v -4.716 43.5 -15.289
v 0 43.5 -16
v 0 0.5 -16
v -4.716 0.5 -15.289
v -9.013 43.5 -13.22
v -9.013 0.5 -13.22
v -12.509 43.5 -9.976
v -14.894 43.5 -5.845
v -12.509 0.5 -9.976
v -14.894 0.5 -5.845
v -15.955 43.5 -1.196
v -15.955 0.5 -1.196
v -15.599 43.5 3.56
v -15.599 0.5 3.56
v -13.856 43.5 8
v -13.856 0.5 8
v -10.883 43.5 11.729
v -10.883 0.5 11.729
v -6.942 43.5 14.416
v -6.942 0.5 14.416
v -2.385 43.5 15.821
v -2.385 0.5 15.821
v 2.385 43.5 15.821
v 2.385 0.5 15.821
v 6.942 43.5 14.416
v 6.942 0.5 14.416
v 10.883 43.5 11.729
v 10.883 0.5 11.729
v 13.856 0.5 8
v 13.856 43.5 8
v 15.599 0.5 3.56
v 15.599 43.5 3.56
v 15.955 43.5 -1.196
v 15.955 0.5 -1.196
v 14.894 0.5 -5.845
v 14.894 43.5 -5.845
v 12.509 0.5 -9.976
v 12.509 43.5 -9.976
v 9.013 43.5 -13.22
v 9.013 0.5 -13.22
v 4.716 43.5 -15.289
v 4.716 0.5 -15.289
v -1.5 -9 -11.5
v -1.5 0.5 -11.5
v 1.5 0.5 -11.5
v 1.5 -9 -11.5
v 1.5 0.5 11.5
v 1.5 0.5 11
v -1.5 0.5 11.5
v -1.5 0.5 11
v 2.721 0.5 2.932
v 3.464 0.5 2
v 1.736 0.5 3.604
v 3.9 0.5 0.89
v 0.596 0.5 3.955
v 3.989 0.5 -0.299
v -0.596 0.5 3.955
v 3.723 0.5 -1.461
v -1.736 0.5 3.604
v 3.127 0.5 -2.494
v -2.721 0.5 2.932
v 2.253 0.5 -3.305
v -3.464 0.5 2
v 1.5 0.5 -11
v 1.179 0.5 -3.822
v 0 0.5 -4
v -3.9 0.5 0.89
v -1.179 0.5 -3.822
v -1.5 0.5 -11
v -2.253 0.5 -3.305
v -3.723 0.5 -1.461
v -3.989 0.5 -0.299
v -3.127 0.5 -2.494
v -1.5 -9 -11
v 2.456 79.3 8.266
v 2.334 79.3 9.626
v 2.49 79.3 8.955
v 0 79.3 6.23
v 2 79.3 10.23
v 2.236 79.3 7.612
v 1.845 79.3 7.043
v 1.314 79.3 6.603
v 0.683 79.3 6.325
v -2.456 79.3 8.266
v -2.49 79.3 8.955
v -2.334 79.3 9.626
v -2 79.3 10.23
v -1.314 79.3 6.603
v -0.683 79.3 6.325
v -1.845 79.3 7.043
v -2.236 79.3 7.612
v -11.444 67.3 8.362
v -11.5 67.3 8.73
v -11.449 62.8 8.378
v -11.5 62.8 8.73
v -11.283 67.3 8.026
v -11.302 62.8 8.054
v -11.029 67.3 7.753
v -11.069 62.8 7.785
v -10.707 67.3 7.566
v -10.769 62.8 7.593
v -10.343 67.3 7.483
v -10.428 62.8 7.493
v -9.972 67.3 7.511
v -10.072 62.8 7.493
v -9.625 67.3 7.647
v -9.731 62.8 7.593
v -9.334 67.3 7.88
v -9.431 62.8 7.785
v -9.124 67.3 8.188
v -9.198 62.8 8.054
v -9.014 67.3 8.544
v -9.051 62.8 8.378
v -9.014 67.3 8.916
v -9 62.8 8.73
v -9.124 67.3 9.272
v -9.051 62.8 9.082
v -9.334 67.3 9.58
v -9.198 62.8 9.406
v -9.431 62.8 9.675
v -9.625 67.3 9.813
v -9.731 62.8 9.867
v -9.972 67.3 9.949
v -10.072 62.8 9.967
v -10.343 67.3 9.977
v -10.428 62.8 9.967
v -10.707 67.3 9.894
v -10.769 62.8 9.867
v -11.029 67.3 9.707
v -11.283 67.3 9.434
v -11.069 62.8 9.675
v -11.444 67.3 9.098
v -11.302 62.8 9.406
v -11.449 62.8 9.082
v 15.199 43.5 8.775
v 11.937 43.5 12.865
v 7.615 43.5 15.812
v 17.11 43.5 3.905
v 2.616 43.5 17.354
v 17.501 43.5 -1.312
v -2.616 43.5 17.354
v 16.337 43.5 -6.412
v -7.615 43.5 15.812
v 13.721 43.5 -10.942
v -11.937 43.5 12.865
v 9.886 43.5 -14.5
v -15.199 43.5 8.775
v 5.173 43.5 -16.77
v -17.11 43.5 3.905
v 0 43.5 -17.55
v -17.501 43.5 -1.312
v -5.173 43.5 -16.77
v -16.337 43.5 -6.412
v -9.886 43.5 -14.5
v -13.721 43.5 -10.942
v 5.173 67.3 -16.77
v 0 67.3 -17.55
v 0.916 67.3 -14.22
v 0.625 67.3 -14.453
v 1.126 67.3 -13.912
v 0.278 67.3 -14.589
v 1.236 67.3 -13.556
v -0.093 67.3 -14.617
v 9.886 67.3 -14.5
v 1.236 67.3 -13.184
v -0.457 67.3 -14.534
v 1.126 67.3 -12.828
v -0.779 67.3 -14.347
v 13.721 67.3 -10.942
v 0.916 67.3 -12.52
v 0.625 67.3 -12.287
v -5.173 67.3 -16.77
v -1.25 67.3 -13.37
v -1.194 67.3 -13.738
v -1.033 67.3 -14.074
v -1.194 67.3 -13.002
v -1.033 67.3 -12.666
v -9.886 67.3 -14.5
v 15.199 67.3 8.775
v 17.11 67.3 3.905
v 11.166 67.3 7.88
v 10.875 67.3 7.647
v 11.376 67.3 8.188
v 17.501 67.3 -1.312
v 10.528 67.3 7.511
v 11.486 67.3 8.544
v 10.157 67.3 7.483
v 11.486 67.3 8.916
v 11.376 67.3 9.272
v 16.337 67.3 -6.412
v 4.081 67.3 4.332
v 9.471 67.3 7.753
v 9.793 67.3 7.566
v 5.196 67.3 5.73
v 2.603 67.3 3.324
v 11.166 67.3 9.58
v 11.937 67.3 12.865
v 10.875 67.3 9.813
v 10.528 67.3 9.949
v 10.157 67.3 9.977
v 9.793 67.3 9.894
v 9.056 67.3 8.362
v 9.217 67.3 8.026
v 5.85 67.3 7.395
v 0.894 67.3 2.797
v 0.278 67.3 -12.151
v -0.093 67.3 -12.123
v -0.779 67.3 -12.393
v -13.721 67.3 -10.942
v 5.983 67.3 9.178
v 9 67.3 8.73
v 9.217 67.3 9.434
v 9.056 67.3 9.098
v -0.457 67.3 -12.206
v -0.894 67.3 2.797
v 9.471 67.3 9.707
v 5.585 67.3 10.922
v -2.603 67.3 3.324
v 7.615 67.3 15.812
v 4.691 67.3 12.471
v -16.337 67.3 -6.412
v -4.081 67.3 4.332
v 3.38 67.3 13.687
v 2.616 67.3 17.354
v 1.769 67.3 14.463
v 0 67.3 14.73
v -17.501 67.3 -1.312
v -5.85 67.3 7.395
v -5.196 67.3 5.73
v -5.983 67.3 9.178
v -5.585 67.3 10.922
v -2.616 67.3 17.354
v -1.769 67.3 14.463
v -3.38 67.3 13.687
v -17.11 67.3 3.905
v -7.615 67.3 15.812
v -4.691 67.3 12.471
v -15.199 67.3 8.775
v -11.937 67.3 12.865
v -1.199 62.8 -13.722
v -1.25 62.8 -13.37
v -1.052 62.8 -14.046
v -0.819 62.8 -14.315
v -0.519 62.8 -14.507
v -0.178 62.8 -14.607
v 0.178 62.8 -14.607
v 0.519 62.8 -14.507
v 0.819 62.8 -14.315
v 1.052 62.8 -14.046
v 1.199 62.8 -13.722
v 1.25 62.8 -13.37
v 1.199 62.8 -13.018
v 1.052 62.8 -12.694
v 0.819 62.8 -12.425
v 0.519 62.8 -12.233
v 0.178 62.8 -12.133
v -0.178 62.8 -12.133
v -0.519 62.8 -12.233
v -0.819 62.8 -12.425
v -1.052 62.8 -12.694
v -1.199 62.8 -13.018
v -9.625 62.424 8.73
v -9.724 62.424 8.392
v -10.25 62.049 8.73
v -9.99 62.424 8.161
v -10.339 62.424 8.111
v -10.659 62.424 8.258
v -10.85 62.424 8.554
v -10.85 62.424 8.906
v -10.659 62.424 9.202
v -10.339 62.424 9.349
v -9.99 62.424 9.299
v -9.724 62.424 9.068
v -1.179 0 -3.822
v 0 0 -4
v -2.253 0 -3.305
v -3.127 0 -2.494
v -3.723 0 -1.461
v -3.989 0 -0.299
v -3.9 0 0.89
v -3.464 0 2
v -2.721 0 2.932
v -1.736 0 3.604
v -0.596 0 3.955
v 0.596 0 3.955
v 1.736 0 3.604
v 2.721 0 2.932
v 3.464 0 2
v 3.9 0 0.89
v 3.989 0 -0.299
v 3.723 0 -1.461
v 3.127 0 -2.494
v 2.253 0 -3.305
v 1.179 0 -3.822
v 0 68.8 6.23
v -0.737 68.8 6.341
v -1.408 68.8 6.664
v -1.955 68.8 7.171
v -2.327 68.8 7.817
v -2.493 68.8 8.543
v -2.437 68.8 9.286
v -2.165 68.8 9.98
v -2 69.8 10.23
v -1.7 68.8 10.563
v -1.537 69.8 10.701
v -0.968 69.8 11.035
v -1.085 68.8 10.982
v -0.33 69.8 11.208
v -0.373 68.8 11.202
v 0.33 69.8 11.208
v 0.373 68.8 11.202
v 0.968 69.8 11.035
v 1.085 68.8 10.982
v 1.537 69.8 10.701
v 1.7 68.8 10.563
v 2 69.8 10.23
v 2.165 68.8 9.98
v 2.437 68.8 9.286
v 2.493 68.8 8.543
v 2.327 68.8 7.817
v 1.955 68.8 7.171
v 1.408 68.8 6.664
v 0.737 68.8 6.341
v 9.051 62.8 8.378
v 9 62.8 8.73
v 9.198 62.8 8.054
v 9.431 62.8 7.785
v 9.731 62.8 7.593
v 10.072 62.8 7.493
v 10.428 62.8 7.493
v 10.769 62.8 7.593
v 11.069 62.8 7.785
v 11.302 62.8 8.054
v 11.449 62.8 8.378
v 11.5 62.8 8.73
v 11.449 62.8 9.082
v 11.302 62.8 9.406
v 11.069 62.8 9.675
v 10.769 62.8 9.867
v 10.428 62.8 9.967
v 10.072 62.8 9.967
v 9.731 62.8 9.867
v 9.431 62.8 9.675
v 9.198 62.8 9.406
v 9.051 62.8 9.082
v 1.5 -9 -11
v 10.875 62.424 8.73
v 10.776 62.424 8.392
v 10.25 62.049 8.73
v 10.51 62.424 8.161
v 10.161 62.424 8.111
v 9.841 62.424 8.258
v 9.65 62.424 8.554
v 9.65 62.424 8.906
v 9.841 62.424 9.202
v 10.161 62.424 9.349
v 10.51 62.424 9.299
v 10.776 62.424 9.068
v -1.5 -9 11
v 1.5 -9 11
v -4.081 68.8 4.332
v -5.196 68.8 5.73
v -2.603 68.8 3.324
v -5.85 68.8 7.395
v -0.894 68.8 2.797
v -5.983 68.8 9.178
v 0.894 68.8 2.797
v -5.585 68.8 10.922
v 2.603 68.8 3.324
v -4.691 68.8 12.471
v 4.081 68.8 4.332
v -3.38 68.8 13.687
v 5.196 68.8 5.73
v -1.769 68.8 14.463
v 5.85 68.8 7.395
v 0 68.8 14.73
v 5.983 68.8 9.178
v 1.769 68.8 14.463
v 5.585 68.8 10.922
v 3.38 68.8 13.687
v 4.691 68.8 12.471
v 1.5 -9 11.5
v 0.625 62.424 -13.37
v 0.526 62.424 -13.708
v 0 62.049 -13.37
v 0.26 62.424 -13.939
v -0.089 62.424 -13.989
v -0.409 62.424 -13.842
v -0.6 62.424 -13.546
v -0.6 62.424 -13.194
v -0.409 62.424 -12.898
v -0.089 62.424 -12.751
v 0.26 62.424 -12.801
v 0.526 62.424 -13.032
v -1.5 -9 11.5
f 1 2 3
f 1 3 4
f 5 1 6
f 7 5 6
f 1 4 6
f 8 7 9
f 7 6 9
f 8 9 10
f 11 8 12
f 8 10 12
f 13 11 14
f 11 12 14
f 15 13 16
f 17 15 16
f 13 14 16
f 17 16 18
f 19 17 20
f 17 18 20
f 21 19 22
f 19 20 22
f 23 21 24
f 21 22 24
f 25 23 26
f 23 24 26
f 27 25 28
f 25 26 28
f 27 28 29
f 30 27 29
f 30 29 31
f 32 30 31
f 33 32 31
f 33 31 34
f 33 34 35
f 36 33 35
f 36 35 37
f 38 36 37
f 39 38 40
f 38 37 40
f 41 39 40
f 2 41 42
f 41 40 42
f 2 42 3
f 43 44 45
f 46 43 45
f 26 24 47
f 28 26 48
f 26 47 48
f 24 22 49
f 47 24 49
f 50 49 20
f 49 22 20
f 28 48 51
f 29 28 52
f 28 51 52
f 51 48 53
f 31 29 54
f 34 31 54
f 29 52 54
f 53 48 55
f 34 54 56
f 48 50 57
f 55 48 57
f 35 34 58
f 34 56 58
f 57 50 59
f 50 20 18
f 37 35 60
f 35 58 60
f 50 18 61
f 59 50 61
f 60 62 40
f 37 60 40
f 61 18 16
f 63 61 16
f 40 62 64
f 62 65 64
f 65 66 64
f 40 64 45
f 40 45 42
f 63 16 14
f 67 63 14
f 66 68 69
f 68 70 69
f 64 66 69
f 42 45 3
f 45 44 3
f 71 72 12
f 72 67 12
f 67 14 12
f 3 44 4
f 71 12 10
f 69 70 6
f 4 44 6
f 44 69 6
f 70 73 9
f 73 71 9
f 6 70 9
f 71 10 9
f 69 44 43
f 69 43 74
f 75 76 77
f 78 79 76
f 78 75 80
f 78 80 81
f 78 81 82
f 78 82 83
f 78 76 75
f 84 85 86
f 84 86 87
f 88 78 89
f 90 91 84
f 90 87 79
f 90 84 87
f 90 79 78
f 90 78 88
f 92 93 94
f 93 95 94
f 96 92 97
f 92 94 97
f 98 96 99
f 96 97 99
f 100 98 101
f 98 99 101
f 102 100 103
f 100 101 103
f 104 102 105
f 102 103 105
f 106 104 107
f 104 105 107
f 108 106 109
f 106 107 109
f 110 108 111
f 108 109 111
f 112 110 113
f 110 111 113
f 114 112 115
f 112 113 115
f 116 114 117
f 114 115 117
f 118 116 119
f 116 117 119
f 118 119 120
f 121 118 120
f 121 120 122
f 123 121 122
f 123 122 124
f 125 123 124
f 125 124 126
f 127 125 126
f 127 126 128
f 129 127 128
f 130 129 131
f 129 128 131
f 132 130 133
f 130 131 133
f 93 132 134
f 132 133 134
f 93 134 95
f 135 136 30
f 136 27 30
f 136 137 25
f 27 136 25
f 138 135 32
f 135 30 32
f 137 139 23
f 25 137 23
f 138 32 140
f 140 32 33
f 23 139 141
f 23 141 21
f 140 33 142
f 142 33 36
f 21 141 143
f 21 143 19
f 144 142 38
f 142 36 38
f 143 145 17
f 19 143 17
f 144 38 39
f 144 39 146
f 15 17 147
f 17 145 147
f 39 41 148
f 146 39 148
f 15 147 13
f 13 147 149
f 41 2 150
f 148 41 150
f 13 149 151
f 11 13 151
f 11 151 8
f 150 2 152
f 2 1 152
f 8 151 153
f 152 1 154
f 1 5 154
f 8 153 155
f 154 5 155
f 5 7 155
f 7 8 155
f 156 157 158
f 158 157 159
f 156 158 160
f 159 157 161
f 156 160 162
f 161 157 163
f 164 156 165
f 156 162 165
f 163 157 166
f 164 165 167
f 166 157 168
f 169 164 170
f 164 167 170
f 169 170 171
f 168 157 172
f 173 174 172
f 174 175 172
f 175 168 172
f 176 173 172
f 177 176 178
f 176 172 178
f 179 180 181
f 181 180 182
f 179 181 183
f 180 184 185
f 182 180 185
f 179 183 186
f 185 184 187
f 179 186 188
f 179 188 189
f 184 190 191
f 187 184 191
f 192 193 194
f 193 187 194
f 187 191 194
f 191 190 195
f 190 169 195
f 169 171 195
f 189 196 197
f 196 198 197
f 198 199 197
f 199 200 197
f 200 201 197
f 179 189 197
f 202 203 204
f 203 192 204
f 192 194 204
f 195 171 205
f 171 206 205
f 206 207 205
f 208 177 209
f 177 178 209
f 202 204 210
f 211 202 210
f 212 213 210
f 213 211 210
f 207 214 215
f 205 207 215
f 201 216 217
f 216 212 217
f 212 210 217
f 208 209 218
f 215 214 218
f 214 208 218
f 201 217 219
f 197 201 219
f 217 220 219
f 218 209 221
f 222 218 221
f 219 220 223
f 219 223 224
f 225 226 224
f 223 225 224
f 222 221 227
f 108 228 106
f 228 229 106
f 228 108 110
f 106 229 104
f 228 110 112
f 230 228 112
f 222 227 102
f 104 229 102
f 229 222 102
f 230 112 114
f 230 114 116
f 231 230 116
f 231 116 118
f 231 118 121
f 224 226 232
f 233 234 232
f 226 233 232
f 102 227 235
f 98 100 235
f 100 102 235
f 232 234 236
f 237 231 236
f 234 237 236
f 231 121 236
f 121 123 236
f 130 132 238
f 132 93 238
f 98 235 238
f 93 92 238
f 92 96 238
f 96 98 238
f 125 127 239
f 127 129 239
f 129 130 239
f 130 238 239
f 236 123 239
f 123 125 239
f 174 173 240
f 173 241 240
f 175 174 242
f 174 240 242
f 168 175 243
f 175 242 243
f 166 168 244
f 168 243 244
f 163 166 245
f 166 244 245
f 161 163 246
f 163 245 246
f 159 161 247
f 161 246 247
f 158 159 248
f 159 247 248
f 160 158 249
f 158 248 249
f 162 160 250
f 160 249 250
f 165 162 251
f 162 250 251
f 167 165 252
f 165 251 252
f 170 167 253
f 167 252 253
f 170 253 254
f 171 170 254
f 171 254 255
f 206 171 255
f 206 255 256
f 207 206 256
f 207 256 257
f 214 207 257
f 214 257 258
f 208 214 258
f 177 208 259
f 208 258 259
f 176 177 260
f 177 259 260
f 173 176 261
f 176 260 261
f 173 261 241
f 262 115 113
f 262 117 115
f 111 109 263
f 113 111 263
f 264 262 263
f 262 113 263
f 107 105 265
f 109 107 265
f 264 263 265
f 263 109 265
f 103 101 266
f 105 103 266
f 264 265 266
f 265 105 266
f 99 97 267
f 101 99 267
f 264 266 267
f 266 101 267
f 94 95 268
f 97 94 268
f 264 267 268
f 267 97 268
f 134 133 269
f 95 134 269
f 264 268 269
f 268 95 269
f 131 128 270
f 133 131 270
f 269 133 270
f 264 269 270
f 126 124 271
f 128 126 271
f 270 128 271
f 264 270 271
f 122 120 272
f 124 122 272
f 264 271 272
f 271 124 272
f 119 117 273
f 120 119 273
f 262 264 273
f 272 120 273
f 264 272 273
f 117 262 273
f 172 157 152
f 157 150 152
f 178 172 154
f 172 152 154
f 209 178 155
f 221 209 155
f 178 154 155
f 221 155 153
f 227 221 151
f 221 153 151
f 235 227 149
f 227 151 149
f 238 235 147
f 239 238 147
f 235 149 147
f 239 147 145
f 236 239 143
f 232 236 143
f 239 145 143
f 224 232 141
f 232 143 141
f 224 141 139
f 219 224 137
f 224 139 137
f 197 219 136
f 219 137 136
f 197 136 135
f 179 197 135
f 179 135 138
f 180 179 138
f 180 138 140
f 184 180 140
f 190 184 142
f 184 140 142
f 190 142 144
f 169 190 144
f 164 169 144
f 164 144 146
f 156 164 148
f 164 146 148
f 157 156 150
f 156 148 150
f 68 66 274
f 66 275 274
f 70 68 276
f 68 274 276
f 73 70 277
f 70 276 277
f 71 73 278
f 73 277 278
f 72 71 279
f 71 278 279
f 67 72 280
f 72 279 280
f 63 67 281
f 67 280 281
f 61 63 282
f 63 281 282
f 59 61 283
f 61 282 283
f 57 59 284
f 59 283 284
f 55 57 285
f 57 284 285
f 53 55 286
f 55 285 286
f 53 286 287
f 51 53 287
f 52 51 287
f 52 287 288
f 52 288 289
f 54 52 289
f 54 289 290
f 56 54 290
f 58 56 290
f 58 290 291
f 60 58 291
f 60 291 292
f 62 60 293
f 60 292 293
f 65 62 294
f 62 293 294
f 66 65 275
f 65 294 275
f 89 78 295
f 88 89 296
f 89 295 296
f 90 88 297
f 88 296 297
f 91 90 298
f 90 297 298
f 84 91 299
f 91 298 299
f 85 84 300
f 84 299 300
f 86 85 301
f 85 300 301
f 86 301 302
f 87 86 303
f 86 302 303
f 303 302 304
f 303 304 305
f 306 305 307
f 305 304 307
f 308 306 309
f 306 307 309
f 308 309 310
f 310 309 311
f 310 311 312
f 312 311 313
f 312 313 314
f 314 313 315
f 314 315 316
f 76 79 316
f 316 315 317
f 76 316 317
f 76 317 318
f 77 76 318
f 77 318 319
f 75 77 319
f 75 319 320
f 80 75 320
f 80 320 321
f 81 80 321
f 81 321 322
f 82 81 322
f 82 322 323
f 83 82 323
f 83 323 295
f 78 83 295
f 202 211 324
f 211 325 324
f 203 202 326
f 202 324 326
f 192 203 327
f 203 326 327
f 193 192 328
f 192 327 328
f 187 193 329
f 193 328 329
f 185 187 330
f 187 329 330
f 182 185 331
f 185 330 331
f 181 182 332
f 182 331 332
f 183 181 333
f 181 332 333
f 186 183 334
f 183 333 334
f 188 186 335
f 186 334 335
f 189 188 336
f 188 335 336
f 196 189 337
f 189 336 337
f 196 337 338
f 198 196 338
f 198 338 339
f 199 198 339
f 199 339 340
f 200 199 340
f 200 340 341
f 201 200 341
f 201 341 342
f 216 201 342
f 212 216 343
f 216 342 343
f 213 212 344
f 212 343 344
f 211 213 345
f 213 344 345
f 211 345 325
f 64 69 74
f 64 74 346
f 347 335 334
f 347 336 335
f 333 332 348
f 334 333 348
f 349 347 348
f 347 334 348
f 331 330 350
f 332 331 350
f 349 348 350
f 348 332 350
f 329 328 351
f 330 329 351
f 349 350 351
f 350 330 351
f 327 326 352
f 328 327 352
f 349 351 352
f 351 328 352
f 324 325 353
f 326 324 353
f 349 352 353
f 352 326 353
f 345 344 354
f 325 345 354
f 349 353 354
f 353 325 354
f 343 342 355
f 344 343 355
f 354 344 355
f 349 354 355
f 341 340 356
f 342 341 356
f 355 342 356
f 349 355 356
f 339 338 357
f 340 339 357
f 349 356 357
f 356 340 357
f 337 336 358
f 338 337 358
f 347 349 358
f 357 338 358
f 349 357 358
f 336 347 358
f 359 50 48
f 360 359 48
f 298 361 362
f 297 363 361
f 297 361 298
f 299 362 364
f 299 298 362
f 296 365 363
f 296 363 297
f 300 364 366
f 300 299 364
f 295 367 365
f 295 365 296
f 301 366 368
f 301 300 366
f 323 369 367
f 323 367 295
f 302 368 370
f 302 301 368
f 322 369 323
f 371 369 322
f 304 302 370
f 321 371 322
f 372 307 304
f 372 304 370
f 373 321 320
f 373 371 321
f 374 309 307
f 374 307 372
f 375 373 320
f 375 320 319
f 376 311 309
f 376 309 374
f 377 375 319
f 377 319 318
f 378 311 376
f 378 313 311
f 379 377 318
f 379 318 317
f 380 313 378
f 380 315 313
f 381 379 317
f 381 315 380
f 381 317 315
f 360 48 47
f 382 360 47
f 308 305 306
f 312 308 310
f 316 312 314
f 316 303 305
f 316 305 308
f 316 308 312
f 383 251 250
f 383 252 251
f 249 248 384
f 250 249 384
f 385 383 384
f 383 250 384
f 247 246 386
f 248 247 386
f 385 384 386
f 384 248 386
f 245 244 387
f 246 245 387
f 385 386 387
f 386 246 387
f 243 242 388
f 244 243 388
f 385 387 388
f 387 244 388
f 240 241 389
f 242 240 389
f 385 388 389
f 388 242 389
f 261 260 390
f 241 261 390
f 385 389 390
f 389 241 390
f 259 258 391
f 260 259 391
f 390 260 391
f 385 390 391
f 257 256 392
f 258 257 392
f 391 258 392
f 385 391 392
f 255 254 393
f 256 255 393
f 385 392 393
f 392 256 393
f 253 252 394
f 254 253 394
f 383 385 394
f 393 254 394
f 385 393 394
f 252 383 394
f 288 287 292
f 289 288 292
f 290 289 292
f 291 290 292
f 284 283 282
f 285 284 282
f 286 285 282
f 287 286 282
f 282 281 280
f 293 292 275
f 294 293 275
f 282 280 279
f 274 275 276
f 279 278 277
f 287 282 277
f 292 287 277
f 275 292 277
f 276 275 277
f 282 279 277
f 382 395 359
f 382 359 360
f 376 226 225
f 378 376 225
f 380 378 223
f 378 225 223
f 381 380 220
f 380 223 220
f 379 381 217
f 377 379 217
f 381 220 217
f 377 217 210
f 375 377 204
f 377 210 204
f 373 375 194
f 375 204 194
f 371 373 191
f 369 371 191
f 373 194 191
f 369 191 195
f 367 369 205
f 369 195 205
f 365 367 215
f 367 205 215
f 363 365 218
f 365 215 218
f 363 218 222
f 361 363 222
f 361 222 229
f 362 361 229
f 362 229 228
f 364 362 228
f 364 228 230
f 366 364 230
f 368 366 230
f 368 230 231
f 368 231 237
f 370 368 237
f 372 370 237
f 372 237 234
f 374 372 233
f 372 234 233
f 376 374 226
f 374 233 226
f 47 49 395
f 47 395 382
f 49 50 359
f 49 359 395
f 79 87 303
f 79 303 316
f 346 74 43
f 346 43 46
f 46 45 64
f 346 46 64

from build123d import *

# Parameters (mm, degrees)
ESQUISSE2_R             = 6
BOSS_EXTRU_1_DEPTH      = 1.5
ESQUISSE3_R             = 2.5
BOSS_EXTRU_2_DEPTH      = 10.5
TROU_TARAUD_M31_D       = 2.5
TROU_TARAUD_M31_DEPTH   = 4.5
TROU_TARAUD_M31_TIP     = 0.751075774
ESQUISSE7_W             = 4
ESQUISSE7_H             = 1.800245102
ENL_V_MAT_EXTRU_1_DEPTH = 9.5
ESQUISSE8_W             = 3
ESQUISSE8_H             = 0.5
BOSS_EXTRU_3_DEPTH      = 9.5


with BuildPart() as part:
    # Esquisse1 → Révolution1 (revolve)
    with BuildSketch(Plane.XY):
        Polygon((16, 0.5), (4, 0.5), (4, 0), (0, 0), (0, 67.3), (17.55, 67.3), (17.55, 43.5), (16, 43.5), align=None)
    revolve(axis=Axis((0, 0, 0), (0, 1, 0)))

    # Esquisse2 → Boss.-Extru.1 (add)
    with BuildSketch(Plane(origin=(0, 67.3, 0), x_dir=(1, 0, 0), z_dir=(0, 1, 0))):
        with Locations((0, -8.73)):
            Circle(ESQUISSE2_R)
    extrude(amount=BOSS_EXTRU_1_DEPTH)

    # Esquisse3 → Boss.-Extru.2 (add)
    with BuildSketch(Plane(origin=(0, 68.8, 0), x_dir=(1, 0, 0), z_dir=(0, 1, 0))):
        with Locations((0, -8.73)):
            Circle(ESQUISSE3_R)
    extrude(amount=BOSS_EXTRU_2_DEPTH)

    # Trou taraudé M31
    with Locations(Plane(origin=(0, 67.3, 0), x_dir=(1, 0, 0), z_dir=(0, 1, 0))):
        with Locations((0, 13.37), (10.25, -8.73), (-10.25, -8.73)):
            Hole(TROU_TARAUD_M31_D / 2, depth=TROU_TARAUD_M31_DEPTH)
            with Locations((0, 0, -(TROU_TARAUD_M31_DEPTH + TROU_TARAUD_M31_TIP / 2))):  # 118° drill point
                Cone(0, TROU_TARAUD_M31_D / 2, TROU_TARAUD_M31_TIP, mode=Mode.SUBTRACT)

    # Esquisse7 → Enlèv. mat.-Extru.1 (cut)
    with BuildSketch(Plane(origin=(0, 79.3, 0), x_dir=(1, 0, 0), z_dir=(0, 1, 0))):
        with Locations((0, -11.130122551)):
            Rectangle(ESQUISSE7_W, ESQUISSE7_H)
    extrude(amount=-ENL_V_MAT_EXTRU_1_DEPTH, mode=Mode.SUBTRACT)

    # Esquisse8 → Boss.-Extru.3 (add)
    with BuildSketch(Plane.XZ.offset(-0.5)):
        with Locations((0, -11.25)):
            Rectangle(ESQUISSE8_W, ESQUISSE8_H)
        with Locations((0, 11.25)):
            Rectangle(ESQUISSE8_W, ESQUISSE8_H)
    extrude(amount=BOSS_EXTRU_3_DEPTH)


solid = part.part
